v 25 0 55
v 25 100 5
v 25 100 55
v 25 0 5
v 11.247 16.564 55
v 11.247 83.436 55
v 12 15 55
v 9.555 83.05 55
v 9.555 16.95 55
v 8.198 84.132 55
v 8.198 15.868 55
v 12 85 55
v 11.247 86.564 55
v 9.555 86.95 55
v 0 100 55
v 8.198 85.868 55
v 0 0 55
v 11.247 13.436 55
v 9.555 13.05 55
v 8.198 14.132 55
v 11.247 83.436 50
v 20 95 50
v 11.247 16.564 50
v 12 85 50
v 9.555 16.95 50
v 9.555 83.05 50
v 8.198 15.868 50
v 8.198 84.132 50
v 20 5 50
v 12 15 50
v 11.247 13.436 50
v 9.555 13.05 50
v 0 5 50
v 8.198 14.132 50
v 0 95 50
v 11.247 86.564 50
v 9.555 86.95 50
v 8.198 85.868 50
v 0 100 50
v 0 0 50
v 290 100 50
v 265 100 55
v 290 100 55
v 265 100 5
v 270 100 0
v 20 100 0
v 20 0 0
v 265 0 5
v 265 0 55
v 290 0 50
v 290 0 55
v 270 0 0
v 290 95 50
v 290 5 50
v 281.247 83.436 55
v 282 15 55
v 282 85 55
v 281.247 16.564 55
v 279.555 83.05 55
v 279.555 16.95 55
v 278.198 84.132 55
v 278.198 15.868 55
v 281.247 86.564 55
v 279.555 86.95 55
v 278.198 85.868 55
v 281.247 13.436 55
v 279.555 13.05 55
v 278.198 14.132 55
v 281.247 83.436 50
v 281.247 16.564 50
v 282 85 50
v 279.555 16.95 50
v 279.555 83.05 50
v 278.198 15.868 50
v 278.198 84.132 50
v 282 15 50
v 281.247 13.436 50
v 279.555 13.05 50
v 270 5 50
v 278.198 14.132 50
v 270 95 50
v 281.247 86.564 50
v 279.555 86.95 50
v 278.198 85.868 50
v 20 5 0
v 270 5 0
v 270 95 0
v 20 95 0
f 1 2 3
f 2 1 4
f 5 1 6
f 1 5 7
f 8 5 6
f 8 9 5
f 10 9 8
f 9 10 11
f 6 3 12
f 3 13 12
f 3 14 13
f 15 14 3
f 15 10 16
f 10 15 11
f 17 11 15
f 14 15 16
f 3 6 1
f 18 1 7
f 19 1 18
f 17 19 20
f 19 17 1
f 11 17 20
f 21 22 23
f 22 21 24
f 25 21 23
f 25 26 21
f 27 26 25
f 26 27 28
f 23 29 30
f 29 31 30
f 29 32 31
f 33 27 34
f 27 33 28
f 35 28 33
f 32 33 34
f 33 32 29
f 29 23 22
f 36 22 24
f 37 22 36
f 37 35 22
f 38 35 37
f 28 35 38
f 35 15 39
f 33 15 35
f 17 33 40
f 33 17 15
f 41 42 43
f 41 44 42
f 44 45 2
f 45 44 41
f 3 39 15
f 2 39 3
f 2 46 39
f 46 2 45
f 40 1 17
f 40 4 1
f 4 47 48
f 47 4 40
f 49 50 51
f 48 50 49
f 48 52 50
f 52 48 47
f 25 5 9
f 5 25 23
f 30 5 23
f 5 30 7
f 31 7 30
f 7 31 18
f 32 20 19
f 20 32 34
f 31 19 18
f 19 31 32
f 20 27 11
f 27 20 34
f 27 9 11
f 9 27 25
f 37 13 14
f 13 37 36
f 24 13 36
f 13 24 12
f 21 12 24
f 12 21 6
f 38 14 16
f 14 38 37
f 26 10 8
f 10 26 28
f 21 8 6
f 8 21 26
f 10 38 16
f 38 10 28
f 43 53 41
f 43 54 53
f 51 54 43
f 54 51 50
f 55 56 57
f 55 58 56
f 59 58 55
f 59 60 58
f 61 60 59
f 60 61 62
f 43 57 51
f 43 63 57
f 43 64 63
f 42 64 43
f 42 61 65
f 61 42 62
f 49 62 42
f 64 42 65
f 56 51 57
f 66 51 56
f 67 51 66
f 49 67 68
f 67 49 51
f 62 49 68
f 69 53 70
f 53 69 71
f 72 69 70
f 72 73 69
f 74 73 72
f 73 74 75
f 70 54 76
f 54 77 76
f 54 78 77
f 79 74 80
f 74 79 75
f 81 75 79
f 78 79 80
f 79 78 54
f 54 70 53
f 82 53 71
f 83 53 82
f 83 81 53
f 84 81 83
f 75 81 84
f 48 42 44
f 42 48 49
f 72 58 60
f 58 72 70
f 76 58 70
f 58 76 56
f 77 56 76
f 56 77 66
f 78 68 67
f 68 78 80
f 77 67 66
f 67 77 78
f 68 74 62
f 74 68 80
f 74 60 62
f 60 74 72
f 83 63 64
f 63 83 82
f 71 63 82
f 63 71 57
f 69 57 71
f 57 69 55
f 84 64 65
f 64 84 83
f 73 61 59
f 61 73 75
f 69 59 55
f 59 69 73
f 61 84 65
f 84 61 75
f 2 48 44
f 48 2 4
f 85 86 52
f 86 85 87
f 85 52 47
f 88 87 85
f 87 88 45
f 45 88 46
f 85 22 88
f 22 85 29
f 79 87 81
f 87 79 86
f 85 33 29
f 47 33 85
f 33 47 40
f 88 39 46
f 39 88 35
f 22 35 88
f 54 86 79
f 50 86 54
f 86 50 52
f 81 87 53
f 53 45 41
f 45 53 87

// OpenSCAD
// Inside Meassurement
width = 240;
depth = 100;
height = 50;

thick = 5;
ear = 20;
screw = 2;
screwoffset = 15;



// Bottom
translate([ear+thick,0,0])
  cube([width,depth,thick]);

// Left Side
translate([ear,0,0])
    cube([thick,depth,height]);  
// Right Side
translate([width+ear+thick,0,0])
    cube([thick,depth,height]);

// Left Ear with screwholes
difference()
{
    translate([0,0,height])
        cube([ear+thick,depth,thick]);
    translate([0.5*ear,screwoffset,height])
        cylinder(thick, screw, screw);
    translate([0.5*ear,depth-screwoffset,height])
        cylinder(thick, screw, screw);    
}

// Right Ear
difference()
{
    translate([width+ear+thick,0,height])
        cube([ear+thick,depth,thick]);
    translate([1.5*ear+width+2*thick,screwoffset,height])
        cylinder(thick, screw, screw);
    translate([1.5*ear+width+2*thick,depth-screwoffset,height])
        cylinder(thick, screw, screw);  
}


// Ear Support
p0 = [0, 0];
p1 = [0, ear];
p2 = [height, ear];
points = [p0, p1, p2];
// Left Ear Support Front
translate([0,thick,height])
    rotate([0,90,270])
    linear_extrude(height=thick)
        polygon(points);
// Left Ear Support Back 
translate([0,depth,height])
    rotate([0,90,270])
    linear_extrude(height=thick)
        polygon(points);
// Right Ear Support Front
translate([width+2*ear+2*thick,0,height])
    rotate([180,90,270])
    linear_extrude(height=thick)
        polygon(points);
// Right Ear Support Back
translate([width+2*ear+2*thick,depth-thick,height])
    rotate([180,90,270])
    linear_extrude(height=thick)
        polygon(points);
